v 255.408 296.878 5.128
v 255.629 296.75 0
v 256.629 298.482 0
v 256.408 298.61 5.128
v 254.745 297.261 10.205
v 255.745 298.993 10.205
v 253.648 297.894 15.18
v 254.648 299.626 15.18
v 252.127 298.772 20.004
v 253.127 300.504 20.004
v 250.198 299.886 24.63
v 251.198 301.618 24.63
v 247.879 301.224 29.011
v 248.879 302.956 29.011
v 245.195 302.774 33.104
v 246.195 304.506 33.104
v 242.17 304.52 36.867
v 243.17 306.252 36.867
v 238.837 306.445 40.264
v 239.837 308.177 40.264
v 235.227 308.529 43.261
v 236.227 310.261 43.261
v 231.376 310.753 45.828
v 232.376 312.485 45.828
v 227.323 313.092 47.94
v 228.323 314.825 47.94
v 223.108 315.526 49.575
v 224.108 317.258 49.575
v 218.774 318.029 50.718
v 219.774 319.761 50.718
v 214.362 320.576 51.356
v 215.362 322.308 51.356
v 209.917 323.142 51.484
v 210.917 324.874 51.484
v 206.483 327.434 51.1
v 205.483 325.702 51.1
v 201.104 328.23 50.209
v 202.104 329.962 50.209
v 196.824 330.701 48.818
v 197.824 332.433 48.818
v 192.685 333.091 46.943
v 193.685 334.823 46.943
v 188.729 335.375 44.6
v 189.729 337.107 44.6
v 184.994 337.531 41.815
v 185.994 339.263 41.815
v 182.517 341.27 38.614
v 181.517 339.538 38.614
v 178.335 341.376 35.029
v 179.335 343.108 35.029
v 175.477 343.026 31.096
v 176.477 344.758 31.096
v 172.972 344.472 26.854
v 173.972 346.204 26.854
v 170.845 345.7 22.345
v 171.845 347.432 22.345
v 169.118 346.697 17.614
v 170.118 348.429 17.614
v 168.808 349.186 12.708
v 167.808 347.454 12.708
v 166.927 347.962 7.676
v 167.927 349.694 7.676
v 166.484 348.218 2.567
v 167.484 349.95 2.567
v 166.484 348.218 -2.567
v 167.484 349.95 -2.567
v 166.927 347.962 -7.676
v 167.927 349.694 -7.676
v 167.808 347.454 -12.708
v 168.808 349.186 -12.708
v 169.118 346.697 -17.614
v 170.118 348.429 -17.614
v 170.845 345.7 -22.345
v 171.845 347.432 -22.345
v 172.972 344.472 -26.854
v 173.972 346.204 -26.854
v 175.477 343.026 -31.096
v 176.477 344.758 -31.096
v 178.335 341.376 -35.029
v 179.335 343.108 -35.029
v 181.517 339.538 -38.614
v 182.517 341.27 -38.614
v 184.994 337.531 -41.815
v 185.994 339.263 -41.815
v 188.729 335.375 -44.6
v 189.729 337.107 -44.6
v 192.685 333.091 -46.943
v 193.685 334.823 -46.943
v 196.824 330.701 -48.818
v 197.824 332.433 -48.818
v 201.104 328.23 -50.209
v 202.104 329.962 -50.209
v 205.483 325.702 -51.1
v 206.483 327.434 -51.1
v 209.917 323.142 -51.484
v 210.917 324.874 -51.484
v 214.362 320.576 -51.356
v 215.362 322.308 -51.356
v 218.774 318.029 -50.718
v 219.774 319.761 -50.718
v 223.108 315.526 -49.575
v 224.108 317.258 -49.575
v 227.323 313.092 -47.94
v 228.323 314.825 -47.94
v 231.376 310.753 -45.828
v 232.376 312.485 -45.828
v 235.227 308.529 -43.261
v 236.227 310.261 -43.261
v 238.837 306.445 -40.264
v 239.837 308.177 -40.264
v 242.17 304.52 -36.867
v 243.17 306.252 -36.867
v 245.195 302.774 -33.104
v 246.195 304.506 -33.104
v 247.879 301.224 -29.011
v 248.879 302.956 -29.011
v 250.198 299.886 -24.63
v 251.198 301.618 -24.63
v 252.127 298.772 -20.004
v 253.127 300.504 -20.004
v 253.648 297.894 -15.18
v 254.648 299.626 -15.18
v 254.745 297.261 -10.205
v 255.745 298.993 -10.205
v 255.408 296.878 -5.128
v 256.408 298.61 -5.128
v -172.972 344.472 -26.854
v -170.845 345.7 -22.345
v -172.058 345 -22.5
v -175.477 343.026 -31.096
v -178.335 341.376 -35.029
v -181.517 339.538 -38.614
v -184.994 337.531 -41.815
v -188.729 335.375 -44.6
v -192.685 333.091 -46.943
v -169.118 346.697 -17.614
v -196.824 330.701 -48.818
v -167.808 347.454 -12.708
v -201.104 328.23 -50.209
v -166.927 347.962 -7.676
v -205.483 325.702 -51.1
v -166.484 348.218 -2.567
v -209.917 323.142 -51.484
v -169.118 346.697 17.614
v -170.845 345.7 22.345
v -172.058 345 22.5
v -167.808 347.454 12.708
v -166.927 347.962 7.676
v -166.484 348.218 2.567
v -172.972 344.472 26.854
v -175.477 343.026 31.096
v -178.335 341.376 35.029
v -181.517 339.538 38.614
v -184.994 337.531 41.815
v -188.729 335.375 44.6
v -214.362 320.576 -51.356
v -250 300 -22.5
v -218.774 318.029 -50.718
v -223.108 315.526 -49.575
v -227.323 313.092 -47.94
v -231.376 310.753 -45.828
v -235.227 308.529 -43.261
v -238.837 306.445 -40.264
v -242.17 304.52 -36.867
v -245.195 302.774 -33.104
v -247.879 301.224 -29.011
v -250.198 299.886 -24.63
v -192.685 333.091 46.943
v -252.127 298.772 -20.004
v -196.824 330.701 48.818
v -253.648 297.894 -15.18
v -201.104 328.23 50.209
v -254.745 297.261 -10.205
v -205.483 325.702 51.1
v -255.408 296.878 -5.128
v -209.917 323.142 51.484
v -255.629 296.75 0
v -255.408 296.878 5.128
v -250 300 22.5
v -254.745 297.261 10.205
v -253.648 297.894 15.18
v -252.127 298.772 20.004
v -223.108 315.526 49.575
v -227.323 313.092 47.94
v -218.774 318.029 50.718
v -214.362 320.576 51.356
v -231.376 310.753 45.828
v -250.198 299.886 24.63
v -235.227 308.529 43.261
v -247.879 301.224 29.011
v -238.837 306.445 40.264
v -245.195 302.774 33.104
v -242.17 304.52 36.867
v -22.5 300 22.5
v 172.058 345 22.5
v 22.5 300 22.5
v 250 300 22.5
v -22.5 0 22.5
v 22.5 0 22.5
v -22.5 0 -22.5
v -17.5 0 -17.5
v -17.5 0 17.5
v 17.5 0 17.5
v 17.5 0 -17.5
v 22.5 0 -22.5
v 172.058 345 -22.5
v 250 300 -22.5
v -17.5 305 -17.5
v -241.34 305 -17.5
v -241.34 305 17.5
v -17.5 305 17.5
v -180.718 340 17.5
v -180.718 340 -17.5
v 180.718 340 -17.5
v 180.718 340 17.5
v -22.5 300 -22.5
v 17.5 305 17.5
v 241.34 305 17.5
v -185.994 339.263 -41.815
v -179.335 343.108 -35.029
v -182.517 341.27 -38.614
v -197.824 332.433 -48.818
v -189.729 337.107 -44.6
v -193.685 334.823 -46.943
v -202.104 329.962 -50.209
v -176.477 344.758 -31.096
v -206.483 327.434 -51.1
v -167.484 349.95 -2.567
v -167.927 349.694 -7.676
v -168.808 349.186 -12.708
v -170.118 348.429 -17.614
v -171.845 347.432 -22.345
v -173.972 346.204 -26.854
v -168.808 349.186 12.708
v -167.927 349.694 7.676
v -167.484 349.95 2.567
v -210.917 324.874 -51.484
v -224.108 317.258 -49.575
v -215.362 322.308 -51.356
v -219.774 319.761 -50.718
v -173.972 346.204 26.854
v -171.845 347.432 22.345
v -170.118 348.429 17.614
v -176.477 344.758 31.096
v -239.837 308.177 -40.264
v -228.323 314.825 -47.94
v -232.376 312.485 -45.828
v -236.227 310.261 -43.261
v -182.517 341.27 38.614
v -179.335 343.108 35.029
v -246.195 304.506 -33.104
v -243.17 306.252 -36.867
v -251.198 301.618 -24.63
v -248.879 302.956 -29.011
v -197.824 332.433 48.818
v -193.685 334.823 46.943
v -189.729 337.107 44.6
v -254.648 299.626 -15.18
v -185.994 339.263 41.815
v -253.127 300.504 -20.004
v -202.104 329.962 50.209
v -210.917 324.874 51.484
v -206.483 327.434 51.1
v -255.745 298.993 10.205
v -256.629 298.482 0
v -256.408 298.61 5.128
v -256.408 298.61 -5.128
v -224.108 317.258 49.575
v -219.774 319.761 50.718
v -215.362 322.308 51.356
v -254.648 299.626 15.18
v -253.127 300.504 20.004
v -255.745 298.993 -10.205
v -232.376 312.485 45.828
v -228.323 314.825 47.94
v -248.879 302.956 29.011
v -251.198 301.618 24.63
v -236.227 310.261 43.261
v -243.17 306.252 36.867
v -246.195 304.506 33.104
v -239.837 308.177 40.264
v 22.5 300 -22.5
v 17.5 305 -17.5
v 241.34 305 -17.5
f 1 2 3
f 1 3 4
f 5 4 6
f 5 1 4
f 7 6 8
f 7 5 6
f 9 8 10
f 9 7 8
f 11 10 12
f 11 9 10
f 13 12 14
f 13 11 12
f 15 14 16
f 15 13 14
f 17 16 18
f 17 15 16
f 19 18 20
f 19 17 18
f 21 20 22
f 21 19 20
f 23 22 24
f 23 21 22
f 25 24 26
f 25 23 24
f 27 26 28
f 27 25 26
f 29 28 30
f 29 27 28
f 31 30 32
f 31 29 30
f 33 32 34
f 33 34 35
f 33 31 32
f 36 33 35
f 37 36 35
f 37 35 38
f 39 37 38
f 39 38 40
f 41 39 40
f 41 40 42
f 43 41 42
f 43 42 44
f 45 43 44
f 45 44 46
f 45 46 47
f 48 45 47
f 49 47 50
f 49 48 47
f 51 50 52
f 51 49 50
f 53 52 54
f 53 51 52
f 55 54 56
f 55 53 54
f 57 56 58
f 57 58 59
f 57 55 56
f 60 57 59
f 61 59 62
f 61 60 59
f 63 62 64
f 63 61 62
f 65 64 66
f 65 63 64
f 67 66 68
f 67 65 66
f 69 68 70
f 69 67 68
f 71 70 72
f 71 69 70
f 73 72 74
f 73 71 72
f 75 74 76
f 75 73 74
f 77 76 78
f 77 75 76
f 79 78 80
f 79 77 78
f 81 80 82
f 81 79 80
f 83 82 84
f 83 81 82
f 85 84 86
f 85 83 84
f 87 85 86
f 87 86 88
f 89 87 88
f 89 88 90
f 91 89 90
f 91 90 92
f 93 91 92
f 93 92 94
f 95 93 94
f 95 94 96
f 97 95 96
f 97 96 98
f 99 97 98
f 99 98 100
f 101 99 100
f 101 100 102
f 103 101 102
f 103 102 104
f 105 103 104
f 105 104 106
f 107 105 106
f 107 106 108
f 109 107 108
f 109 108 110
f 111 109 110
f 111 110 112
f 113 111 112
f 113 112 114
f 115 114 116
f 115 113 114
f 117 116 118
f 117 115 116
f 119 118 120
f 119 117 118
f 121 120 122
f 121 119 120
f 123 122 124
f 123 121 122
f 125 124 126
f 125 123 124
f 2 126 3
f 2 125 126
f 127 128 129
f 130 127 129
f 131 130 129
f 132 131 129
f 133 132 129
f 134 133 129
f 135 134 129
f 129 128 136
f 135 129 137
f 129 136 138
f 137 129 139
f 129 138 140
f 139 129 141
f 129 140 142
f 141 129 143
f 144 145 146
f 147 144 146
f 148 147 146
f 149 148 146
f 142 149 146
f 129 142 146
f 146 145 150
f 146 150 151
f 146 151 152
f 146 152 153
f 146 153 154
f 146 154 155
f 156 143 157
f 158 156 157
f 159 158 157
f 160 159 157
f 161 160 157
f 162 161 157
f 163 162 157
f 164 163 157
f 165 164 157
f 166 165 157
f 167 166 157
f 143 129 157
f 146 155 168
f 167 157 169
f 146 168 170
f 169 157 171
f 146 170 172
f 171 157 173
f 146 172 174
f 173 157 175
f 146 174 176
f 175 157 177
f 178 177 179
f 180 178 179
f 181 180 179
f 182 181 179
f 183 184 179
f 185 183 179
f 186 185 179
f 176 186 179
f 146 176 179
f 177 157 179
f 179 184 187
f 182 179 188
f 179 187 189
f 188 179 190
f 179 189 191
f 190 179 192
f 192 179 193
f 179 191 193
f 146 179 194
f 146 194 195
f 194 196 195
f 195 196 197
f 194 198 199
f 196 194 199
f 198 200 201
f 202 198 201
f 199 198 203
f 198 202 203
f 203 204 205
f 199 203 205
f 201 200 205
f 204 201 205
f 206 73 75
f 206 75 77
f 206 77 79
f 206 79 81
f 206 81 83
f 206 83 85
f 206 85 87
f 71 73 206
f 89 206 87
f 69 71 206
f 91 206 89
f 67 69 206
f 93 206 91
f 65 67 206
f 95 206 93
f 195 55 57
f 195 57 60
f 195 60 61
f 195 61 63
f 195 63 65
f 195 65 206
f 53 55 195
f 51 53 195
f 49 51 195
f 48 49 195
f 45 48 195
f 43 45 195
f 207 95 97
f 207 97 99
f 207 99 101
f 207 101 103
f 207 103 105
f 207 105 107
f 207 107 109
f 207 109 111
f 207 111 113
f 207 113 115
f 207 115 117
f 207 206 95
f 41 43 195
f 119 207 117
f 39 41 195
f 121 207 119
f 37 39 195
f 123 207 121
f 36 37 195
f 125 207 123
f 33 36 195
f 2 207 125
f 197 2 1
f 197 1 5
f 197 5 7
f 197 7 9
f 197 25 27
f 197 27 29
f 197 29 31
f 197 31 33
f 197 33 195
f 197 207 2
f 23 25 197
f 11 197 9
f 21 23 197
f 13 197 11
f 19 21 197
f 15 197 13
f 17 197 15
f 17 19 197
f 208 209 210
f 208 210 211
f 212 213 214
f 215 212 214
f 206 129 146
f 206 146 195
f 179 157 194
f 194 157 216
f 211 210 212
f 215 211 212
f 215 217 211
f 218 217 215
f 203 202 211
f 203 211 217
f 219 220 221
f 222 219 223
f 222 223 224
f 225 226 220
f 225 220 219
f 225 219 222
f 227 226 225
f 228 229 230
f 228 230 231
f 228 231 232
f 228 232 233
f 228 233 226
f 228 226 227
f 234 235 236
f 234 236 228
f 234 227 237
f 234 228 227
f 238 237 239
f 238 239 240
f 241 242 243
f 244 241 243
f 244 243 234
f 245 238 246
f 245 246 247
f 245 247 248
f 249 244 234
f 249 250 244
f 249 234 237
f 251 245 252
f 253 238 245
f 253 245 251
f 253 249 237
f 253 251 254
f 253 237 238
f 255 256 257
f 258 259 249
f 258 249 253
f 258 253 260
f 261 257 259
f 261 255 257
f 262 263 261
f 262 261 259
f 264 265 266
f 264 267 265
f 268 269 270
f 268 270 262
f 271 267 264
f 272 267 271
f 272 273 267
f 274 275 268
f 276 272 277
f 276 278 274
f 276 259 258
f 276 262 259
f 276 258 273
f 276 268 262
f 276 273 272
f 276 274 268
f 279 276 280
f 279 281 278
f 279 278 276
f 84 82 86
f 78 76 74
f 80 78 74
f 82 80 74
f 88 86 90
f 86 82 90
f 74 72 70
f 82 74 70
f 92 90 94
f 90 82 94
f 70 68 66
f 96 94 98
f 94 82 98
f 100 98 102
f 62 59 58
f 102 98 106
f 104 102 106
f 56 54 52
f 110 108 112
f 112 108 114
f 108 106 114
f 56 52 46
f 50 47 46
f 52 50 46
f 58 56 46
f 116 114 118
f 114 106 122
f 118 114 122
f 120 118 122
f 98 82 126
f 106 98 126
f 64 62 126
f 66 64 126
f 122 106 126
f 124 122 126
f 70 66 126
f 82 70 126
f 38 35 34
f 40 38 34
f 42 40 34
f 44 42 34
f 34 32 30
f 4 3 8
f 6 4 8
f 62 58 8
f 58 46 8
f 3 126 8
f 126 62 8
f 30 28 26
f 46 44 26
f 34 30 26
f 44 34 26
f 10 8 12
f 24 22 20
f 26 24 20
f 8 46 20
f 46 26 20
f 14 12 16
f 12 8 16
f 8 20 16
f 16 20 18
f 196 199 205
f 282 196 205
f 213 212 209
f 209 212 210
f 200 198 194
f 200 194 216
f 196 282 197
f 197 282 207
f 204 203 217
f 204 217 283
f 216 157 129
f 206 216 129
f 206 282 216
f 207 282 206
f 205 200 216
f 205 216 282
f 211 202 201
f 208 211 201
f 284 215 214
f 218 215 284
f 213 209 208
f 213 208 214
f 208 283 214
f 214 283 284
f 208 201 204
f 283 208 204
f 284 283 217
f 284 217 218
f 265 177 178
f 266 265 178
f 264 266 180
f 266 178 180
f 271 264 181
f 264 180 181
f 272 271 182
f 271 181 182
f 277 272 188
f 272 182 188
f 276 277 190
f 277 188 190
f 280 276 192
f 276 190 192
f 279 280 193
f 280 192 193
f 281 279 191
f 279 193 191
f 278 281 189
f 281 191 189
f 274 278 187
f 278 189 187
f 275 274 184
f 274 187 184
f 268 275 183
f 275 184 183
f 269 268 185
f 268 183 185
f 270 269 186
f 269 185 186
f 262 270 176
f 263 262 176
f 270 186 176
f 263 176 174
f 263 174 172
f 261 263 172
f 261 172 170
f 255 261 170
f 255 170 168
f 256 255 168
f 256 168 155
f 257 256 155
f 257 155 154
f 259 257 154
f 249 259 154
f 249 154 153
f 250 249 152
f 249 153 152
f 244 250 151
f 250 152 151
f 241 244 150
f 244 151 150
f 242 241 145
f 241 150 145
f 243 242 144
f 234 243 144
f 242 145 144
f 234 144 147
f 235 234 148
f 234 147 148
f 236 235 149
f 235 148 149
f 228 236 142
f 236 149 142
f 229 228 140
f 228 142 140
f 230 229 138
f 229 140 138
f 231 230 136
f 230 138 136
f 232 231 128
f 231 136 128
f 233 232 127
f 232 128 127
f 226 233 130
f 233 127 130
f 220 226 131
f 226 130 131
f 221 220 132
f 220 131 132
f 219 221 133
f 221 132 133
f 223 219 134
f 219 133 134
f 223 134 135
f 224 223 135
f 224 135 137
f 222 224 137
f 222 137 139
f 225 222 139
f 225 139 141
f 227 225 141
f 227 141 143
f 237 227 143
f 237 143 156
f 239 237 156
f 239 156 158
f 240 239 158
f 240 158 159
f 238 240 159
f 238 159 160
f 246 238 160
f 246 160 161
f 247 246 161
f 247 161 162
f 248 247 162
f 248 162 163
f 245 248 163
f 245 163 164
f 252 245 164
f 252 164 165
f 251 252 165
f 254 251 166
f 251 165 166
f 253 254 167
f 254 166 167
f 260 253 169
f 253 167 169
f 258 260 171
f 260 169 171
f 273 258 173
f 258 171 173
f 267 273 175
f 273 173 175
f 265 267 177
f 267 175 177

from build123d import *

# Parameters (mm, degrees)
SKETCH1_W           = 45
SKETCH1_H           = 45
BOSS_EXTRUDE1_DEPTH = 300
SKETCH2_W           = 500
SKETCH2_H           = 45
BOSS_EXTRUDE2_DEPTH = 45
SHELL2_T            = -5
CUT_EXTRUDE1_DEPTH  = 45
SKETCH5_R           = 51.5
BOSS_EXTRUDE3_DEPTH = 2


with BuildPart() as part:
    # Sketch1 → Boss-Extrude1 (new body)
    with BuildSketch(Plane(origin=(0, 0, 0), x_dir=(1, 0, 0), z_dir=(0, 1, 0))):
        Rectangle(SKETCH1_W, SKETCH1_H)
    extrude(amount=BOSS_EXTRUDE1_DEPTH)

    # Sketch2 → Boss-Extrude2 (add)
    with BuildSketch(Plane(origin=(0, 300, 0), x_dir=(1, 0, 0), z_dir=(0, 1, 0))):
        Rectangle(SKETCH2_W, SKETCH2_H)
    extrude(amount=BOSS_EXTRUDE2_DEPTH)

    # Shell2
    shell2_openings = [part.faces().sort_by_distance(p)[0] for p in [
        (250, 322.5, 0),
        (-250, 322.5, 0),
        (0, 0, 0),
    ]]
    offset(amount=SHELL2_T, openings=shell2_openings, kind=Kind.INTERSECTION)

    # Sketch4 → Cut-Extrude1 (cut)
    with BuildSketch(Plane.XY.offset(22.5)):
        Polygon((-250, 300), (-172.057713659, 345), (-187.263807884, 591.817806189), (-292.402197695, 585.340379431), (-265.544239109, 495.362755895), align=None)
    cut_extrude1 = extrude(amount=-CUT_EXTRUDE1_DEPTH, mode=Mode.SUBTRACT)

    # Sketch5 → Boss-Extrude3 (add)
    with BuildSketch(Plane(origin=(-192.403810568, 333.253175473, 0), x_dir=(0.8660254037844376, 0.500000000000002, 0), z_dir=(-0.5000000000000019, 0.8660254037844375, 0))):
        with Locations(Location((-21.506350946, 0, 0), (0, 0, 180))):
            Circle(SKETCH5_R)
    boss_extrude3 = extrude(amount=BOSS_EXTRUDE3_DEPTH)

    # Mirror1: Cut-Extrude1, Boss-Extrude3 across plane
    add(cut_extrude1.mirror(Plane(origin=(0, 0, 0), x_dir=(0, 0, 1), z_dir=(1, 0, 0))), mode=Mode.SUBTRACT)
    add(boss_extrude3.mirror(Plane(origin=(0, 0, 0), x_dir=(0, 0, 1), z_dir=(1, 0, 0))))


solid = part.part
